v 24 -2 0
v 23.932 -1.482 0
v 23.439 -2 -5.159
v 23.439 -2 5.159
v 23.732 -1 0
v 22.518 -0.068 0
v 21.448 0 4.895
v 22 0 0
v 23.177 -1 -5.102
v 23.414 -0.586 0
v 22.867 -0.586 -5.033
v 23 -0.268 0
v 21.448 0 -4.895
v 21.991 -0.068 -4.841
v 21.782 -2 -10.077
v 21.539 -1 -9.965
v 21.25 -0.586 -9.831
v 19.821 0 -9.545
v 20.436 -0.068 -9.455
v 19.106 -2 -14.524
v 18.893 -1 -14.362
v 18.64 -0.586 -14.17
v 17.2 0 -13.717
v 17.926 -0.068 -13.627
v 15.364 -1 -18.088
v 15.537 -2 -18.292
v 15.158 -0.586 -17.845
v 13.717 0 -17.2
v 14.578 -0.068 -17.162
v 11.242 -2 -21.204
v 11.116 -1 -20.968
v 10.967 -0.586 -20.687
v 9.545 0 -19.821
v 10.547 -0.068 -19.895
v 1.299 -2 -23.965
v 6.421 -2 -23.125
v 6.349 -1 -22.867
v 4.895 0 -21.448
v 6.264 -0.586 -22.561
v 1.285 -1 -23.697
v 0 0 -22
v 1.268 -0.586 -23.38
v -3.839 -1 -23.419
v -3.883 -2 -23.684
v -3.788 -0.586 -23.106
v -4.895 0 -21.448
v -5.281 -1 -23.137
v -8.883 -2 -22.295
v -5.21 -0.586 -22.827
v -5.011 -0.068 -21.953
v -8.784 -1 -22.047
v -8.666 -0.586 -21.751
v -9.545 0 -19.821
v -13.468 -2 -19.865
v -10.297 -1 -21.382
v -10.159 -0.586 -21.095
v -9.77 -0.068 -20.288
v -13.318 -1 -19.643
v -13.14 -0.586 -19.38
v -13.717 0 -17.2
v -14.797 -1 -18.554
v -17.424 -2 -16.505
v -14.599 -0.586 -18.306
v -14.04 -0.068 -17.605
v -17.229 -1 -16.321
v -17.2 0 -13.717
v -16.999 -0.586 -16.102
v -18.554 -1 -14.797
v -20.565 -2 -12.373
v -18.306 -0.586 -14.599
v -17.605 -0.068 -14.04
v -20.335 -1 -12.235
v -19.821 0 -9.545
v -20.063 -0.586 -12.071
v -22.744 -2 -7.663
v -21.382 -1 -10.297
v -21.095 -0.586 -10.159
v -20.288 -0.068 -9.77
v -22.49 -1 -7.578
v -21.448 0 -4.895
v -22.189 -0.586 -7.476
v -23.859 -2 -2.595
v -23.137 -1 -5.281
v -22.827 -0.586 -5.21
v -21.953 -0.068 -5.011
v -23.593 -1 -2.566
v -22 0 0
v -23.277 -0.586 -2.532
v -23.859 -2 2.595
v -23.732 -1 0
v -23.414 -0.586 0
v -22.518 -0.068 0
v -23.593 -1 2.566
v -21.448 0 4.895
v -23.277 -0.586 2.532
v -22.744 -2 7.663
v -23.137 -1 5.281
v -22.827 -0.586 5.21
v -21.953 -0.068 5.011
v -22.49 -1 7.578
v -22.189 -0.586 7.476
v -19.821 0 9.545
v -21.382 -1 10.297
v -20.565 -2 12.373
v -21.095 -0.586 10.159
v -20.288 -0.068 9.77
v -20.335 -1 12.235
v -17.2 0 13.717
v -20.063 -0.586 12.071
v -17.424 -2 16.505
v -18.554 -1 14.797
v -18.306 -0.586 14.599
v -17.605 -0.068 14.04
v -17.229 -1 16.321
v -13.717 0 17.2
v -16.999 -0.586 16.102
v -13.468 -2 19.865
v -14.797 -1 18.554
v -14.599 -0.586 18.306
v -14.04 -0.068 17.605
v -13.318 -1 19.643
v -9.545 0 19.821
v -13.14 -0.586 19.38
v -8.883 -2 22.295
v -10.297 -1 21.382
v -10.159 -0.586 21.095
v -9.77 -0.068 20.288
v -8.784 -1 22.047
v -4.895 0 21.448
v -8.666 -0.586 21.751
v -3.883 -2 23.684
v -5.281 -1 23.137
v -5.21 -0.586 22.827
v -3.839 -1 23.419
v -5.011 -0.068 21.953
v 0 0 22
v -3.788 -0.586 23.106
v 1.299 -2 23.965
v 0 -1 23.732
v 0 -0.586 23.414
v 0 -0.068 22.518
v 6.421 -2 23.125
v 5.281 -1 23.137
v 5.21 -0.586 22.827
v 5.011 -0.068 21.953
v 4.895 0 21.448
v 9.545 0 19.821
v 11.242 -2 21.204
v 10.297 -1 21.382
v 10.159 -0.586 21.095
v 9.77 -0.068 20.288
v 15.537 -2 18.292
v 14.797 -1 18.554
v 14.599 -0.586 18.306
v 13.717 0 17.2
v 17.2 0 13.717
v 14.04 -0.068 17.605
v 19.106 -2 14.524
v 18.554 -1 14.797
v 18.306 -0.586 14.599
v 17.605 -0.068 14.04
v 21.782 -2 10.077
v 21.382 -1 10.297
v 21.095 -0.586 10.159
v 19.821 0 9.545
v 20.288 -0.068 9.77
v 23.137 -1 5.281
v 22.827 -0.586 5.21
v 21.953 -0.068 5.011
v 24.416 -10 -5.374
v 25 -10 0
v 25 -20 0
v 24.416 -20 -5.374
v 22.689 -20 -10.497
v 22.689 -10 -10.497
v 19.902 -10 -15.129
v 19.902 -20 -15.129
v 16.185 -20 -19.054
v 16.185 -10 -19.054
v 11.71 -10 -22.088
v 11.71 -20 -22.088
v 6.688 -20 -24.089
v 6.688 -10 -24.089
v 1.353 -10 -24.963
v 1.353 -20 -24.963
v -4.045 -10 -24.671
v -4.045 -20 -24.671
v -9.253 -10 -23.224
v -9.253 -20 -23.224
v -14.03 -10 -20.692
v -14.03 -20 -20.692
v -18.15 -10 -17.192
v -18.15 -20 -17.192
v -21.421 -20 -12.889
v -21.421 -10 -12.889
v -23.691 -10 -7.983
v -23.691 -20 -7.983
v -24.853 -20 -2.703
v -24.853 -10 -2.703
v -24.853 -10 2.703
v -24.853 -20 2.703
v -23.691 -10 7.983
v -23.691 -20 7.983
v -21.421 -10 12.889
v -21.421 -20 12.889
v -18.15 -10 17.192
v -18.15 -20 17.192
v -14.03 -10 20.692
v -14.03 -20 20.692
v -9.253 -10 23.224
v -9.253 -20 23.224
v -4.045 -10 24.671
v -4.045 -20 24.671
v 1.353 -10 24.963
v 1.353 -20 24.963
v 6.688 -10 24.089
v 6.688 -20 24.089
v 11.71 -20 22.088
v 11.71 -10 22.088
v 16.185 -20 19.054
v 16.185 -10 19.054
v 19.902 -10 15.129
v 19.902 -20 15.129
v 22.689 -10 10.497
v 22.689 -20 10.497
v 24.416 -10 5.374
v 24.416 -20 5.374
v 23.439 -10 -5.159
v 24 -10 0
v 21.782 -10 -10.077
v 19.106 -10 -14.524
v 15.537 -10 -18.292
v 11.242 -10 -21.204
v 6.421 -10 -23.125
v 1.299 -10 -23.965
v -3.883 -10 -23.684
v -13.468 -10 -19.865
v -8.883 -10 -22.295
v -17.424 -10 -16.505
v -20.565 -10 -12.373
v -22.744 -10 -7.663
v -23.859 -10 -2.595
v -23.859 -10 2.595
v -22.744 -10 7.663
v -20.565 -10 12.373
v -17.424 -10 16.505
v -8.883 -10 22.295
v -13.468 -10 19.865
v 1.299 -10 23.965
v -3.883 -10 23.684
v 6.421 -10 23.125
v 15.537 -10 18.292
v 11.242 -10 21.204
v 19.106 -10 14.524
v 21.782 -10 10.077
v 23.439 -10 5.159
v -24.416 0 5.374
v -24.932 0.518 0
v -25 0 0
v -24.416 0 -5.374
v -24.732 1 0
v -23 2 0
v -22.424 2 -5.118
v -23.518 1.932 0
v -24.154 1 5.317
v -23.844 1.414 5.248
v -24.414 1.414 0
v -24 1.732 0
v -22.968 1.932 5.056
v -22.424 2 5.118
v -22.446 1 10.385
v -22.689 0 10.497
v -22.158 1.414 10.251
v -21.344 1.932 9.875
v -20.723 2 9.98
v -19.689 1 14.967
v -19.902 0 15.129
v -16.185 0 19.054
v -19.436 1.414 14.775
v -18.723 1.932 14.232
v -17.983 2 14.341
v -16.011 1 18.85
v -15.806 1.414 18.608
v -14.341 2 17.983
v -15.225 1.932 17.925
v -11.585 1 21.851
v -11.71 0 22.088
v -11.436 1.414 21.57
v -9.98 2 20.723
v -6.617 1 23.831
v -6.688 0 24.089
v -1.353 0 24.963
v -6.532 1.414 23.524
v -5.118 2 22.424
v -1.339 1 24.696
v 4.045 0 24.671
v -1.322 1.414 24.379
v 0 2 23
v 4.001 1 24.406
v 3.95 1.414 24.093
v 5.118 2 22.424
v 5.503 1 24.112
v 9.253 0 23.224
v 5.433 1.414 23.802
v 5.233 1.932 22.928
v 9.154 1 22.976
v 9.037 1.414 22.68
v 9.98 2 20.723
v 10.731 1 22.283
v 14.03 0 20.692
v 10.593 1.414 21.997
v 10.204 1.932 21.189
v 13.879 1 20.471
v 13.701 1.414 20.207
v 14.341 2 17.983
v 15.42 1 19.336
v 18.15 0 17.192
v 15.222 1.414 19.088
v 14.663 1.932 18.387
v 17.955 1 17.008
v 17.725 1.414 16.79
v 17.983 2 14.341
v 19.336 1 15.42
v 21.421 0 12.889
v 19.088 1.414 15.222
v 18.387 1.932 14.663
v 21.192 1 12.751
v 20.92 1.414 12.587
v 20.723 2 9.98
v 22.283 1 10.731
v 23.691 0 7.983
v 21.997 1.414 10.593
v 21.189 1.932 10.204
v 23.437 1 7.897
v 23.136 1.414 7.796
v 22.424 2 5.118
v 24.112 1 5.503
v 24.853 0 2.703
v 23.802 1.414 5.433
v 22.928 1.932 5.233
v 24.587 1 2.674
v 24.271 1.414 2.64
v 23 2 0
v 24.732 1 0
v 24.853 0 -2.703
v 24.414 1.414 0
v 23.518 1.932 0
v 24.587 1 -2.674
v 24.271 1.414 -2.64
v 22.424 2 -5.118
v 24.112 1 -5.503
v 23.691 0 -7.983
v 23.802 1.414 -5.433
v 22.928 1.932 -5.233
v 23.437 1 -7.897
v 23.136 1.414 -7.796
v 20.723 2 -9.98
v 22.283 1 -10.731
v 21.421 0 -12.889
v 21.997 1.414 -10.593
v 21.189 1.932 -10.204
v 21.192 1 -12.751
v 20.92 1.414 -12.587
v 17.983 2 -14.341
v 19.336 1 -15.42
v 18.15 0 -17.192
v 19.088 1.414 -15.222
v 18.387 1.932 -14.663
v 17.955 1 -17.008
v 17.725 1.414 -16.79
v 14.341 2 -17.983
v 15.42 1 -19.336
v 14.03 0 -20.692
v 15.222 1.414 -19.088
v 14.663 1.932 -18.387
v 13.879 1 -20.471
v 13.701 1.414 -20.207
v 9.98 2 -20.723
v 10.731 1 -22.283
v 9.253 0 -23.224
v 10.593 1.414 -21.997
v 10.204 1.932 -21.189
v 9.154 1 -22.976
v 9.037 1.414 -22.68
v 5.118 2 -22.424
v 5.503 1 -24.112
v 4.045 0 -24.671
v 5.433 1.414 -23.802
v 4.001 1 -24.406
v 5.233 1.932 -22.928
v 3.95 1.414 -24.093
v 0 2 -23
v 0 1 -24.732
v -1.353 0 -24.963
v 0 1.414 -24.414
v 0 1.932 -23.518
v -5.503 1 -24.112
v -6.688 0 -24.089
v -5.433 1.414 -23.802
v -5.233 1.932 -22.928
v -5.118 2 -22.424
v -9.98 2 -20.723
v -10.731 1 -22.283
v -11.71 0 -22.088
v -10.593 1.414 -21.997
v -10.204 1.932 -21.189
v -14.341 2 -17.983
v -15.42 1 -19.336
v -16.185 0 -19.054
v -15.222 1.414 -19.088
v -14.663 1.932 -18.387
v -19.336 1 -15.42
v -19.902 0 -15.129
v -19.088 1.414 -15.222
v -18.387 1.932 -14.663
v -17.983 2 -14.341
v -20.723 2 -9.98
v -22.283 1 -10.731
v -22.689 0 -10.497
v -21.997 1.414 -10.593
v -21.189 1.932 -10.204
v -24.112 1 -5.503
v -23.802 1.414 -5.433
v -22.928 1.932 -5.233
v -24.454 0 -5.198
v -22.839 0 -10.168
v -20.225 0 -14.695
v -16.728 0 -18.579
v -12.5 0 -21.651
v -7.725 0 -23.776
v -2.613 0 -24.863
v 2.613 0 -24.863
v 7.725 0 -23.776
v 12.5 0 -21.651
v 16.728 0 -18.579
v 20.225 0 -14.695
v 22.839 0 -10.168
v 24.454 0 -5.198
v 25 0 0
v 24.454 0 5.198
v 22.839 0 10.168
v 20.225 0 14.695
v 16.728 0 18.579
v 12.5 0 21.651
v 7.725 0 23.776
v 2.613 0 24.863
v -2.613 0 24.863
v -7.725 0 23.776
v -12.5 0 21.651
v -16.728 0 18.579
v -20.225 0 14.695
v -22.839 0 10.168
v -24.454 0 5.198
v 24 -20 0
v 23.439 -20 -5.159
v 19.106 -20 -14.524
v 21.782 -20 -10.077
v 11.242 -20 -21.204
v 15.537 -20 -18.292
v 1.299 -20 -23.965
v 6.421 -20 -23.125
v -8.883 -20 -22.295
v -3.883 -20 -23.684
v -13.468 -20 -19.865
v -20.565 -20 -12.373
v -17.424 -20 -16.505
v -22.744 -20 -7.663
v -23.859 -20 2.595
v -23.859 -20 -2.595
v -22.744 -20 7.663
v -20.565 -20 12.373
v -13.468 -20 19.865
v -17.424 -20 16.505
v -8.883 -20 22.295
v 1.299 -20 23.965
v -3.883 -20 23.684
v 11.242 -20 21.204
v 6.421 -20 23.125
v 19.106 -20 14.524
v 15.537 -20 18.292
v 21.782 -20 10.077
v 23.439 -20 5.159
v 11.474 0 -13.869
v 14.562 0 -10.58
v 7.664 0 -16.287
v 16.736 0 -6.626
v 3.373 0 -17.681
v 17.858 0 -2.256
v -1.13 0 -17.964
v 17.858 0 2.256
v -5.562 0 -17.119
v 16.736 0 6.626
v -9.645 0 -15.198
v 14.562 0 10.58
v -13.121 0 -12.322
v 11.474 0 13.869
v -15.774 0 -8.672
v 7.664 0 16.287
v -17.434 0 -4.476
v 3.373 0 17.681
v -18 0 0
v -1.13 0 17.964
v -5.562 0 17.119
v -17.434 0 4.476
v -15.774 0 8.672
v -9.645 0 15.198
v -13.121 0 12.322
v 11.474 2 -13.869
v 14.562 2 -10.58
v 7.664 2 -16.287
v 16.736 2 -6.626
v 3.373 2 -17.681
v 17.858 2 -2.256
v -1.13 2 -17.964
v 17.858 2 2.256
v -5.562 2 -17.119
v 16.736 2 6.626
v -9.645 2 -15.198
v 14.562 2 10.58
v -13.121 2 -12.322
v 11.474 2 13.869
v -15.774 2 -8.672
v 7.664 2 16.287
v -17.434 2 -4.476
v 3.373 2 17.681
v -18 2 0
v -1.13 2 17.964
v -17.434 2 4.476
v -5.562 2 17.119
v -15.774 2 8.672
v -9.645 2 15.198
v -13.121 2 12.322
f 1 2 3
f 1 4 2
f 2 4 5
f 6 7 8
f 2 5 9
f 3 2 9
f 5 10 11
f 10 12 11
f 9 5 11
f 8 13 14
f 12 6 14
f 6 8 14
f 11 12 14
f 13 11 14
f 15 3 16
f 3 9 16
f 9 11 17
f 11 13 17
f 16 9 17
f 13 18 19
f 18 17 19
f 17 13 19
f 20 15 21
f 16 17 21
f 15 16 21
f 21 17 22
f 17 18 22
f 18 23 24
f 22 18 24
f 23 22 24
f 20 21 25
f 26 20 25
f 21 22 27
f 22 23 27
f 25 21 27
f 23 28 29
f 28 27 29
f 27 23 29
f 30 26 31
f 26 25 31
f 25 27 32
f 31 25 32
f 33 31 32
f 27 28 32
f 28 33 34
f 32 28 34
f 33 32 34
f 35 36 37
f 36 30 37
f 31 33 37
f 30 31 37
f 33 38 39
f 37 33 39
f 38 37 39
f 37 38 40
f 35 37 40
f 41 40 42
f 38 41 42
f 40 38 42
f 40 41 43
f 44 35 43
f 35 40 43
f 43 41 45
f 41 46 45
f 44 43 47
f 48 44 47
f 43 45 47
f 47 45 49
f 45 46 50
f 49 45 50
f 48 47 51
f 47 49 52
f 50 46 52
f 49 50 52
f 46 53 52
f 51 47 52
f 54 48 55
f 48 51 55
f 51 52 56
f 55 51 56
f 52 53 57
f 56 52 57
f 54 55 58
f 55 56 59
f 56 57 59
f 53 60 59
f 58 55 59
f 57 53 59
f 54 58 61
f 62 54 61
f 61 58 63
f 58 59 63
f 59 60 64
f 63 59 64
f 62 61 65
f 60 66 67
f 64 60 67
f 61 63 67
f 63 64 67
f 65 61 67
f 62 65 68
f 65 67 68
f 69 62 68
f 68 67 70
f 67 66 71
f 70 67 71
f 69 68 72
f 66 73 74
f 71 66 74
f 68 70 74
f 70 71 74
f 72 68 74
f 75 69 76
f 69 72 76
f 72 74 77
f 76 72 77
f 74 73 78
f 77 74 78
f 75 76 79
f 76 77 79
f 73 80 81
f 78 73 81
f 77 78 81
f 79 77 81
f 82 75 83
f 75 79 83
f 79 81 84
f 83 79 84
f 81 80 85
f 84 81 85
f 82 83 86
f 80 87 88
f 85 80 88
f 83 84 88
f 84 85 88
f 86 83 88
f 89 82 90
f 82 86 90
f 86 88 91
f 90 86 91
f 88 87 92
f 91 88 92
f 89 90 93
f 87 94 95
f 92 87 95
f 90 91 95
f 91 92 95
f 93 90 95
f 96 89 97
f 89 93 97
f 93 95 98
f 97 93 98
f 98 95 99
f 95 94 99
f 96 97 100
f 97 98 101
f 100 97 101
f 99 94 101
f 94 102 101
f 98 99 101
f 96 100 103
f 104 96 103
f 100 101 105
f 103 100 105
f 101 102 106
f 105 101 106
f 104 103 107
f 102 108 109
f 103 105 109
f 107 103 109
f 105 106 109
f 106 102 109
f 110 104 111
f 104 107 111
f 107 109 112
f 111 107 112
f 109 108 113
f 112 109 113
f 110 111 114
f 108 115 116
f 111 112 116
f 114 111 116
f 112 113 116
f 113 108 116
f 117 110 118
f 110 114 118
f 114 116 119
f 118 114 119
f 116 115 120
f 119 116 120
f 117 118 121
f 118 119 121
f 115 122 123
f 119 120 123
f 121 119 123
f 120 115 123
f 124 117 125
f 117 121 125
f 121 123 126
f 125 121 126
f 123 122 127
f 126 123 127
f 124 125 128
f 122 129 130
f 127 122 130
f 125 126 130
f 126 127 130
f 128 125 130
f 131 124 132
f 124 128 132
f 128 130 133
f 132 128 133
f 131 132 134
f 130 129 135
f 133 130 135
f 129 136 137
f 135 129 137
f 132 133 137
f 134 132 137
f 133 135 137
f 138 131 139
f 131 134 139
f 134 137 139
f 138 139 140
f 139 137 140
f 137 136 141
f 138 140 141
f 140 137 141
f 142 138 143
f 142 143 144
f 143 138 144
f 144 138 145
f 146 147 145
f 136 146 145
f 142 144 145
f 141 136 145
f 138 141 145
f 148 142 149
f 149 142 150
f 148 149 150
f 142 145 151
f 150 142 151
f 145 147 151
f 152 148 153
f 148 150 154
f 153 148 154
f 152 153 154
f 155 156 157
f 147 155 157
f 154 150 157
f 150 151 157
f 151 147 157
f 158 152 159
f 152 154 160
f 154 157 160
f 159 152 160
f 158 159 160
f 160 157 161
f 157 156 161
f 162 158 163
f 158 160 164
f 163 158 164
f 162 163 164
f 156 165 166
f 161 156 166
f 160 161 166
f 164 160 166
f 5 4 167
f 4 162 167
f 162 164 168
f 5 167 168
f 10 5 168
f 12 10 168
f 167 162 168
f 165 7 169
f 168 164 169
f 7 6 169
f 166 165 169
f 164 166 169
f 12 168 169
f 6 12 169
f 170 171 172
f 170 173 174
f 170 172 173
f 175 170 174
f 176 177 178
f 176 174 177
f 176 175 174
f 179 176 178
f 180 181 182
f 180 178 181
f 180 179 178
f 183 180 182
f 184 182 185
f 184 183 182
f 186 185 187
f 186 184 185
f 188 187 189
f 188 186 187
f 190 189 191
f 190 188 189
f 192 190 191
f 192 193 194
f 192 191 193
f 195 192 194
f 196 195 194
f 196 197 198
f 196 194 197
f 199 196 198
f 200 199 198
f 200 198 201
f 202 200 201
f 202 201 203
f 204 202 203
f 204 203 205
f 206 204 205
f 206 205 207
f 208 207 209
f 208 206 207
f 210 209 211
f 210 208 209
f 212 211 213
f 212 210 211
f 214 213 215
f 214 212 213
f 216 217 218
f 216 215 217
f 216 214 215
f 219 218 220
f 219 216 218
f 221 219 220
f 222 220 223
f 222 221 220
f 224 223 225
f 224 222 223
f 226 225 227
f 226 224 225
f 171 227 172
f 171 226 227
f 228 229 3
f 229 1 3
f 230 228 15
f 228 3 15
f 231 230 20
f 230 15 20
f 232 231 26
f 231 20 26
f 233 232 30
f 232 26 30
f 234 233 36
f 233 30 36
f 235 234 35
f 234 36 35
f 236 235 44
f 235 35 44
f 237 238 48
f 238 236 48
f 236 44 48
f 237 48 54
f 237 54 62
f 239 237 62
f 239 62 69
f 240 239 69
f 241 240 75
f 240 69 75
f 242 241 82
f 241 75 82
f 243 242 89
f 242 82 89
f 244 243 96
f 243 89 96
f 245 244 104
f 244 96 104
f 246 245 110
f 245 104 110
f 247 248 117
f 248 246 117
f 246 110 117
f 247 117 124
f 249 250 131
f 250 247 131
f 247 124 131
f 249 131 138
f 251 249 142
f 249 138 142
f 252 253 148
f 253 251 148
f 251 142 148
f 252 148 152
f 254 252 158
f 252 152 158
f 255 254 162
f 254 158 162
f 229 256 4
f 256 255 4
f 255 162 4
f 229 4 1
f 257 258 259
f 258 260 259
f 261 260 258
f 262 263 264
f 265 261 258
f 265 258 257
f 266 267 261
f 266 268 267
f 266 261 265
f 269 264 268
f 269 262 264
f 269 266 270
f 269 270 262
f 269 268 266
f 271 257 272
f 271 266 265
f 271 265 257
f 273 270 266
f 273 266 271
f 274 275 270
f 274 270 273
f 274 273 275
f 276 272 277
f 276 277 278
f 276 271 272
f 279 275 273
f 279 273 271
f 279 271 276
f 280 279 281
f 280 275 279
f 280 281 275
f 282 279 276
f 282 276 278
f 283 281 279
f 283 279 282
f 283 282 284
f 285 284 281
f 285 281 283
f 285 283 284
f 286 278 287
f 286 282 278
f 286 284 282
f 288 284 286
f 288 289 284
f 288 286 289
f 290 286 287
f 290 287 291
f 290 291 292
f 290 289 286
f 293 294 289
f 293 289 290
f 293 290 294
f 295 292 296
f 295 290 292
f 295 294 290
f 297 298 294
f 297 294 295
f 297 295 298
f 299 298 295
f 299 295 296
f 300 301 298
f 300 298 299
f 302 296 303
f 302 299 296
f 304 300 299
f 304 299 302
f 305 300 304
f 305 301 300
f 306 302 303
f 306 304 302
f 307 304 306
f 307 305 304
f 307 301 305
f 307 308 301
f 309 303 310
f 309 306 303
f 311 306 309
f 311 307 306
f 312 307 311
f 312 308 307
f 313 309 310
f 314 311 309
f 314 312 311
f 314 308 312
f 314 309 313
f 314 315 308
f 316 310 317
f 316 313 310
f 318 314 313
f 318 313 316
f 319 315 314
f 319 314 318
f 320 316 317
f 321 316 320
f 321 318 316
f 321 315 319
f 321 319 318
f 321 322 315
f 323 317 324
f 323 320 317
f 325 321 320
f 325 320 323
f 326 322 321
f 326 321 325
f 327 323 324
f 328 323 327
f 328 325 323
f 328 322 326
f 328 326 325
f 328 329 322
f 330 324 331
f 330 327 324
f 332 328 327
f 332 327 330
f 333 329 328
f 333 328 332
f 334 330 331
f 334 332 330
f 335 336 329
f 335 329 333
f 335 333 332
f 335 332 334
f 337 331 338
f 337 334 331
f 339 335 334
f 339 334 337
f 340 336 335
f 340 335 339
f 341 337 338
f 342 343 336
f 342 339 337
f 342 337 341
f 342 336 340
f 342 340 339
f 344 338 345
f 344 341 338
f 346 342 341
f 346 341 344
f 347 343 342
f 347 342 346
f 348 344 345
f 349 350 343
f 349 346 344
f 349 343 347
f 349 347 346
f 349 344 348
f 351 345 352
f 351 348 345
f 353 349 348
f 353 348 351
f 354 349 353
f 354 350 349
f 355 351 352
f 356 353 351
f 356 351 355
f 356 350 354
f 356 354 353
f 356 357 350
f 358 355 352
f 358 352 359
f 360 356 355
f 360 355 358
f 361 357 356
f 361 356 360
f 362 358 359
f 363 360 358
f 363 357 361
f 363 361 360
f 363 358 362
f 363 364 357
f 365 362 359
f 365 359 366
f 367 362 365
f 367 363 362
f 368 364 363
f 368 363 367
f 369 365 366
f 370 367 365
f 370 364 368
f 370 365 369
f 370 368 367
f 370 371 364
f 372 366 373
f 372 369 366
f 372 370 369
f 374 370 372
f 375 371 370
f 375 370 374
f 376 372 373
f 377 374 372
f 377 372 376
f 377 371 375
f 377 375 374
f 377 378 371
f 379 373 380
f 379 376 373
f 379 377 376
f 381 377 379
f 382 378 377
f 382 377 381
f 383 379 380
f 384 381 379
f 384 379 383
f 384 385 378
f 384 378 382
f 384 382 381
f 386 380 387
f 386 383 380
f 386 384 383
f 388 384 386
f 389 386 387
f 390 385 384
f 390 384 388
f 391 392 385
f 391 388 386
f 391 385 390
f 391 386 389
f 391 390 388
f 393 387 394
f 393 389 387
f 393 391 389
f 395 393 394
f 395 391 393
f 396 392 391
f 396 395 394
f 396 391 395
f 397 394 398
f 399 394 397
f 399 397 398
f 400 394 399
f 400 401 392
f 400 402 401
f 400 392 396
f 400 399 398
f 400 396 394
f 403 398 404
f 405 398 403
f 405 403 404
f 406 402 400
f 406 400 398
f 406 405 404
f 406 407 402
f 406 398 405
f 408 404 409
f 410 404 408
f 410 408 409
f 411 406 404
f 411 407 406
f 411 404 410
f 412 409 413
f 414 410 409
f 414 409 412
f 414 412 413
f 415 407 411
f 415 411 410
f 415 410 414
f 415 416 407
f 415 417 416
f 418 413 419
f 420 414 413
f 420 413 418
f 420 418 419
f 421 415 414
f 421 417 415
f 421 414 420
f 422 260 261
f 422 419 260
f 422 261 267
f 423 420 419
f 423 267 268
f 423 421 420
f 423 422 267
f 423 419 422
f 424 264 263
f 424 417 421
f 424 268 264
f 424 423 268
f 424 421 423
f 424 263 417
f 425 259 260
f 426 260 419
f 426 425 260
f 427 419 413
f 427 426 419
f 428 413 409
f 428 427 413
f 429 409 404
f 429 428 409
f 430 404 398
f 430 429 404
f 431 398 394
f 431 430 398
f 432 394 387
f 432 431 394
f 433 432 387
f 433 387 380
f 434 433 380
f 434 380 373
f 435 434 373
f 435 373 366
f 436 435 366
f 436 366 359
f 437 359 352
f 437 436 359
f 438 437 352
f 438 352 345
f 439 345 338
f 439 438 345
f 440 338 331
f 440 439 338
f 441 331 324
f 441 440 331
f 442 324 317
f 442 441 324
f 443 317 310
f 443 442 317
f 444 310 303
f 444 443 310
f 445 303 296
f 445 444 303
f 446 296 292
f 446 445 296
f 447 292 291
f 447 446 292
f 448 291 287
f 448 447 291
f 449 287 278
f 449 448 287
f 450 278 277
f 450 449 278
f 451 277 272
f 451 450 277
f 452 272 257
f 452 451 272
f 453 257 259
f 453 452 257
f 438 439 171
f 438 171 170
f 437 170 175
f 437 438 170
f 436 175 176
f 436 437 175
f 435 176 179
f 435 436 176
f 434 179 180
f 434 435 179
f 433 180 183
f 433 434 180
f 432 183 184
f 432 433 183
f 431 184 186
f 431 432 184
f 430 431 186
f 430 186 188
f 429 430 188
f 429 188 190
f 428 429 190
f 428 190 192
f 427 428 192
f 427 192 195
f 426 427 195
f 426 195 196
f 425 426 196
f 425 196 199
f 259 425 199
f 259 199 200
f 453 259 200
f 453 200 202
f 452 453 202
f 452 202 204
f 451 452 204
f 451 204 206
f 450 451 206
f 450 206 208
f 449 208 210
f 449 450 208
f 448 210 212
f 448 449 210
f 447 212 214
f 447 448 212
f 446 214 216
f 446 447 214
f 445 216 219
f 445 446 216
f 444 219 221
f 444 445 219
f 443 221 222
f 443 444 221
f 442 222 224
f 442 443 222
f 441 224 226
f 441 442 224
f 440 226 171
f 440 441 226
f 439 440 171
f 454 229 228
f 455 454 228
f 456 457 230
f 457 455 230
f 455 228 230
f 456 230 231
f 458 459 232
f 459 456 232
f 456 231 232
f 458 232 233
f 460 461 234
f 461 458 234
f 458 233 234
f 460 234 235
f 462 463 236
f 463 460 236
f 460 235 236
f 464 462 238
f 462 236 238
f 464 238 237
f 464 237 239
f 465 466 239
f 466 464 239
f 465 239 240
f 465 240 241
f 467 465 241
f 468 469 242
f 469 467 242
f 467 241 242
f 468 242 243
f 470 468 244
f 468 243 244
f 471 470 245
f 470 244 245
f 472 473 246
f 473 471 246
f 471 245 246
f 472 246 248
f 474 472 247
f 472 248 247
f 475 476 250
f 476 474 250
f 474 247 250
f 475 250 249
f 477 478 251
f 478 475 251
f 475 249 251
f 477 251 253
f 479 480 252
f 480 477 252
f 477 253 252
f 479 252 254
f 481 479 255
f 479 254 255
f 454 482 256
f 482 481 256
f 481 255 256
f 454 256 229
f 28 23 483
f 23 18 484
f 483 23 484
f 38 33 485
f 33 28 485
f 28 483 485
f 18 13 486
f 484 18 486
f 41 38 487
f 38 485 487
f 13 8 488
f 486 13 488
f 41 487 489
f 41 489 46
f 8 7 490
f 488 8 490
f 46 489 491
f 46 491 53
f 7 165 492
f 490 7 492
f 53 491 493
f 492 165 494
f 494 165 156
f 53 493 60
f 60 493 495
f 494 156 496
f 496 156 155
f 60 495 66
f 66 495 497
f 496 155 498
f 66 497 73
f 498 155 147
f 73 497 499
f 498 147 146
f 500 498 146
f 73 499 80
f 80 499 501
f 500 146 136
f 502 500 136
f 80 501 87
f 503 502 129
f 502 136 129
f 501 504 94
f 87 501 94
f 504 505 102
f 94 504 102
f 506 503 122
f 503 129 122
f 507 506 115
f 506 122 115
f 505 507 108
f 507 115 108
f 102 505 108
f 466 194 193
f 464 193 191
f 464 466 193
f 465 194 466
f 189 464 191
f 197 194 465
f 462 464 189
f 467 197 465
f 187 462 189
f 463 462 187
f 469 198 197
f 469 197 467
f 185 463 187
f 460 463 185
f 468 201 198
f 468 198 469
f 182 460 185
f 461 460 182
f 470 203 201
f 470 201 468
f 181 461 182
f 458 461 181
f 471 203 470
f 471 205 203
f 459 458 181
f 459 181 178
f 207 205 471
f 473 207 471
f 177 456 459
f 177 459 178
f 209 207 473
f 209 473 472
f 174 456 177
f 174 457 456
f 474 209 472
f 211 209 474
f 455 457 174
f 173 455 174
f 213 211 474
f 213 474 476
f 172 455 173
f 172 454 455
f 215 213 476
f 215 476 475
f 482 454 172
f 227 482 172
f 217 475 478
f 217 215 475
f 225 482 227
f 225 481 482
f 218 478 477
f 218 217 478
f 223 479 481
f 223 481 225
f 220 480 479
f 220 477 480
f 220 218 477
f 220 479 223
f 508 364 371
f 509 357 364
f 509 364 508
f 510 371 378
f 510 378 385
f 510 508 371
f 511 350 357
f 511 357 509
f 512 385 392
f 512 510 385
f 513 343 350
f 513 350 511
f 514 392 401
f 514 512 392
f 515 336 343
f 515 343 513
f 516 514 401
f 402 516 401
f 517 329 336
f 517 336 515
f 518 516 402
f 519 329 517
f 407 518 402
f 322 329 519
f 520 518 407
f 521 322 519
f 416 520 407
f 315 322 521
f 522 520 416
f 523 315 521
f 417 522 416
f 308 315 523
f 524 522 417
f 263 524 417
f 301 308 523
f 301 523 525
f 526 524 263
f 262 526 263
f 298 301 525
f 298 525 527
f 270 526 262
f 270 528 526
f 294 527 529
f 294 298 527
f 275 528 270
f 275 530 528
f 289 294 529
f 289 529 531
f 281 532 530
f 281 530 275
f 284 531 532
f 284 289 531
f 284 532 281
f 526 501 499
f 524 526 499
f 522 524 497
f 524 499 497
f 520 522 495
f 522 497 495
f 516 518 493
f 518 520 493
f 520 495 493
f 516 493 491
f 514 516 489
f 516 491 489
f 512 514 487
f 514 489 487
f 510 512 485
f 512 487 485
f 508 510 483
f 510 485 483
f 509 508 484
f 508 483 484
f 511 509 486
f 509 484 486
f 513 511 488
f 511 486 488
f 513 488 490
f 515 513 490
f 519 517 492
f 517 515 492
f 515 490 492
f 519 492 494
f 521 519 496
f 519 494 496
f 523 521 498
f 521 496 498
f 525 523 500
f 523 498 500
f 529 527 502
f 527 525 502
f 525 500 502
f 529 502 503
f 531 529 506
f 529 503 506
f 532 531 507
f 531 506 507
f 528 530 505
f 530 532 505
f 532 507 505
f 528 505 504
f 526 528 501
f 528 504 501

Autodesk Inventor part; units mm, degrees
ref_plane "YZ Plane" through (0, 0, 0) normal (1, 0, 0) x (0, 1, 0)
ref_plane "XZ Plane" through (0, 0, 0) normal (0, 1, 0) x (-1, 0, 0)
ref_plane "XY Plane" through (0, 0, 0) normal (0, 0, 1) x (1, 0, 0)
sketch "Sketch1" plane through (0, 0, 0) normal (0, 1, 0) x (-1, 0, 0)
  circle A0 centre (0, 0) radius 18
  circle A1 centre (0, 0) radius 25
  dimension "d0" = 36
  dimension "d1" = 50
extrude "Extrusion1" add sketch "Sketch1" along normal blind 2
sketch "Sketch2" plane through (0, 0, 0) normal (0, -1, 0) x (1, 0, 0)
  circle A0 centre (0, 0) radius 25 projected
  circle A1 centre (0, 0) radius 18 projected
  circle A2 centre (0, 0) radius 25
  circle A3 centre (0, 0) radius 24
  dimension "d4" = 48
extrude "Extrusion2" add sketch "Sketch2" along normal blind 10 contours A0
fillet "Fillet1" radius 2 1 edges at (-24, 0, 0)
fillet "Fillet2" radius 2 1 edges at (25, 2, 0)
sketch "Sketch3" plane through (0, -10, 0) normal (0, -1, 0) x (1, 0, 0)
  point P0 (0, 0)
sketch "Sketch4" plane through (0, 2, 0) normal (0, 1, 0) x (1, 0, 0)
  circle A0 centre (0, 0) radius 25 projected
  dimension "d9" = 50
sketch "Sketch5" plane through (0, -10, 0) normal (0, -1, 0) x (1, 0, 0)
  circle A0 centre (0, 0) radius 25 projected
  circle A1 centre (0, 0) radius 24 projected
extrude "Extrusion3" add sketch "Sketch5" along normal blind 10
properties part number "controler_02"
